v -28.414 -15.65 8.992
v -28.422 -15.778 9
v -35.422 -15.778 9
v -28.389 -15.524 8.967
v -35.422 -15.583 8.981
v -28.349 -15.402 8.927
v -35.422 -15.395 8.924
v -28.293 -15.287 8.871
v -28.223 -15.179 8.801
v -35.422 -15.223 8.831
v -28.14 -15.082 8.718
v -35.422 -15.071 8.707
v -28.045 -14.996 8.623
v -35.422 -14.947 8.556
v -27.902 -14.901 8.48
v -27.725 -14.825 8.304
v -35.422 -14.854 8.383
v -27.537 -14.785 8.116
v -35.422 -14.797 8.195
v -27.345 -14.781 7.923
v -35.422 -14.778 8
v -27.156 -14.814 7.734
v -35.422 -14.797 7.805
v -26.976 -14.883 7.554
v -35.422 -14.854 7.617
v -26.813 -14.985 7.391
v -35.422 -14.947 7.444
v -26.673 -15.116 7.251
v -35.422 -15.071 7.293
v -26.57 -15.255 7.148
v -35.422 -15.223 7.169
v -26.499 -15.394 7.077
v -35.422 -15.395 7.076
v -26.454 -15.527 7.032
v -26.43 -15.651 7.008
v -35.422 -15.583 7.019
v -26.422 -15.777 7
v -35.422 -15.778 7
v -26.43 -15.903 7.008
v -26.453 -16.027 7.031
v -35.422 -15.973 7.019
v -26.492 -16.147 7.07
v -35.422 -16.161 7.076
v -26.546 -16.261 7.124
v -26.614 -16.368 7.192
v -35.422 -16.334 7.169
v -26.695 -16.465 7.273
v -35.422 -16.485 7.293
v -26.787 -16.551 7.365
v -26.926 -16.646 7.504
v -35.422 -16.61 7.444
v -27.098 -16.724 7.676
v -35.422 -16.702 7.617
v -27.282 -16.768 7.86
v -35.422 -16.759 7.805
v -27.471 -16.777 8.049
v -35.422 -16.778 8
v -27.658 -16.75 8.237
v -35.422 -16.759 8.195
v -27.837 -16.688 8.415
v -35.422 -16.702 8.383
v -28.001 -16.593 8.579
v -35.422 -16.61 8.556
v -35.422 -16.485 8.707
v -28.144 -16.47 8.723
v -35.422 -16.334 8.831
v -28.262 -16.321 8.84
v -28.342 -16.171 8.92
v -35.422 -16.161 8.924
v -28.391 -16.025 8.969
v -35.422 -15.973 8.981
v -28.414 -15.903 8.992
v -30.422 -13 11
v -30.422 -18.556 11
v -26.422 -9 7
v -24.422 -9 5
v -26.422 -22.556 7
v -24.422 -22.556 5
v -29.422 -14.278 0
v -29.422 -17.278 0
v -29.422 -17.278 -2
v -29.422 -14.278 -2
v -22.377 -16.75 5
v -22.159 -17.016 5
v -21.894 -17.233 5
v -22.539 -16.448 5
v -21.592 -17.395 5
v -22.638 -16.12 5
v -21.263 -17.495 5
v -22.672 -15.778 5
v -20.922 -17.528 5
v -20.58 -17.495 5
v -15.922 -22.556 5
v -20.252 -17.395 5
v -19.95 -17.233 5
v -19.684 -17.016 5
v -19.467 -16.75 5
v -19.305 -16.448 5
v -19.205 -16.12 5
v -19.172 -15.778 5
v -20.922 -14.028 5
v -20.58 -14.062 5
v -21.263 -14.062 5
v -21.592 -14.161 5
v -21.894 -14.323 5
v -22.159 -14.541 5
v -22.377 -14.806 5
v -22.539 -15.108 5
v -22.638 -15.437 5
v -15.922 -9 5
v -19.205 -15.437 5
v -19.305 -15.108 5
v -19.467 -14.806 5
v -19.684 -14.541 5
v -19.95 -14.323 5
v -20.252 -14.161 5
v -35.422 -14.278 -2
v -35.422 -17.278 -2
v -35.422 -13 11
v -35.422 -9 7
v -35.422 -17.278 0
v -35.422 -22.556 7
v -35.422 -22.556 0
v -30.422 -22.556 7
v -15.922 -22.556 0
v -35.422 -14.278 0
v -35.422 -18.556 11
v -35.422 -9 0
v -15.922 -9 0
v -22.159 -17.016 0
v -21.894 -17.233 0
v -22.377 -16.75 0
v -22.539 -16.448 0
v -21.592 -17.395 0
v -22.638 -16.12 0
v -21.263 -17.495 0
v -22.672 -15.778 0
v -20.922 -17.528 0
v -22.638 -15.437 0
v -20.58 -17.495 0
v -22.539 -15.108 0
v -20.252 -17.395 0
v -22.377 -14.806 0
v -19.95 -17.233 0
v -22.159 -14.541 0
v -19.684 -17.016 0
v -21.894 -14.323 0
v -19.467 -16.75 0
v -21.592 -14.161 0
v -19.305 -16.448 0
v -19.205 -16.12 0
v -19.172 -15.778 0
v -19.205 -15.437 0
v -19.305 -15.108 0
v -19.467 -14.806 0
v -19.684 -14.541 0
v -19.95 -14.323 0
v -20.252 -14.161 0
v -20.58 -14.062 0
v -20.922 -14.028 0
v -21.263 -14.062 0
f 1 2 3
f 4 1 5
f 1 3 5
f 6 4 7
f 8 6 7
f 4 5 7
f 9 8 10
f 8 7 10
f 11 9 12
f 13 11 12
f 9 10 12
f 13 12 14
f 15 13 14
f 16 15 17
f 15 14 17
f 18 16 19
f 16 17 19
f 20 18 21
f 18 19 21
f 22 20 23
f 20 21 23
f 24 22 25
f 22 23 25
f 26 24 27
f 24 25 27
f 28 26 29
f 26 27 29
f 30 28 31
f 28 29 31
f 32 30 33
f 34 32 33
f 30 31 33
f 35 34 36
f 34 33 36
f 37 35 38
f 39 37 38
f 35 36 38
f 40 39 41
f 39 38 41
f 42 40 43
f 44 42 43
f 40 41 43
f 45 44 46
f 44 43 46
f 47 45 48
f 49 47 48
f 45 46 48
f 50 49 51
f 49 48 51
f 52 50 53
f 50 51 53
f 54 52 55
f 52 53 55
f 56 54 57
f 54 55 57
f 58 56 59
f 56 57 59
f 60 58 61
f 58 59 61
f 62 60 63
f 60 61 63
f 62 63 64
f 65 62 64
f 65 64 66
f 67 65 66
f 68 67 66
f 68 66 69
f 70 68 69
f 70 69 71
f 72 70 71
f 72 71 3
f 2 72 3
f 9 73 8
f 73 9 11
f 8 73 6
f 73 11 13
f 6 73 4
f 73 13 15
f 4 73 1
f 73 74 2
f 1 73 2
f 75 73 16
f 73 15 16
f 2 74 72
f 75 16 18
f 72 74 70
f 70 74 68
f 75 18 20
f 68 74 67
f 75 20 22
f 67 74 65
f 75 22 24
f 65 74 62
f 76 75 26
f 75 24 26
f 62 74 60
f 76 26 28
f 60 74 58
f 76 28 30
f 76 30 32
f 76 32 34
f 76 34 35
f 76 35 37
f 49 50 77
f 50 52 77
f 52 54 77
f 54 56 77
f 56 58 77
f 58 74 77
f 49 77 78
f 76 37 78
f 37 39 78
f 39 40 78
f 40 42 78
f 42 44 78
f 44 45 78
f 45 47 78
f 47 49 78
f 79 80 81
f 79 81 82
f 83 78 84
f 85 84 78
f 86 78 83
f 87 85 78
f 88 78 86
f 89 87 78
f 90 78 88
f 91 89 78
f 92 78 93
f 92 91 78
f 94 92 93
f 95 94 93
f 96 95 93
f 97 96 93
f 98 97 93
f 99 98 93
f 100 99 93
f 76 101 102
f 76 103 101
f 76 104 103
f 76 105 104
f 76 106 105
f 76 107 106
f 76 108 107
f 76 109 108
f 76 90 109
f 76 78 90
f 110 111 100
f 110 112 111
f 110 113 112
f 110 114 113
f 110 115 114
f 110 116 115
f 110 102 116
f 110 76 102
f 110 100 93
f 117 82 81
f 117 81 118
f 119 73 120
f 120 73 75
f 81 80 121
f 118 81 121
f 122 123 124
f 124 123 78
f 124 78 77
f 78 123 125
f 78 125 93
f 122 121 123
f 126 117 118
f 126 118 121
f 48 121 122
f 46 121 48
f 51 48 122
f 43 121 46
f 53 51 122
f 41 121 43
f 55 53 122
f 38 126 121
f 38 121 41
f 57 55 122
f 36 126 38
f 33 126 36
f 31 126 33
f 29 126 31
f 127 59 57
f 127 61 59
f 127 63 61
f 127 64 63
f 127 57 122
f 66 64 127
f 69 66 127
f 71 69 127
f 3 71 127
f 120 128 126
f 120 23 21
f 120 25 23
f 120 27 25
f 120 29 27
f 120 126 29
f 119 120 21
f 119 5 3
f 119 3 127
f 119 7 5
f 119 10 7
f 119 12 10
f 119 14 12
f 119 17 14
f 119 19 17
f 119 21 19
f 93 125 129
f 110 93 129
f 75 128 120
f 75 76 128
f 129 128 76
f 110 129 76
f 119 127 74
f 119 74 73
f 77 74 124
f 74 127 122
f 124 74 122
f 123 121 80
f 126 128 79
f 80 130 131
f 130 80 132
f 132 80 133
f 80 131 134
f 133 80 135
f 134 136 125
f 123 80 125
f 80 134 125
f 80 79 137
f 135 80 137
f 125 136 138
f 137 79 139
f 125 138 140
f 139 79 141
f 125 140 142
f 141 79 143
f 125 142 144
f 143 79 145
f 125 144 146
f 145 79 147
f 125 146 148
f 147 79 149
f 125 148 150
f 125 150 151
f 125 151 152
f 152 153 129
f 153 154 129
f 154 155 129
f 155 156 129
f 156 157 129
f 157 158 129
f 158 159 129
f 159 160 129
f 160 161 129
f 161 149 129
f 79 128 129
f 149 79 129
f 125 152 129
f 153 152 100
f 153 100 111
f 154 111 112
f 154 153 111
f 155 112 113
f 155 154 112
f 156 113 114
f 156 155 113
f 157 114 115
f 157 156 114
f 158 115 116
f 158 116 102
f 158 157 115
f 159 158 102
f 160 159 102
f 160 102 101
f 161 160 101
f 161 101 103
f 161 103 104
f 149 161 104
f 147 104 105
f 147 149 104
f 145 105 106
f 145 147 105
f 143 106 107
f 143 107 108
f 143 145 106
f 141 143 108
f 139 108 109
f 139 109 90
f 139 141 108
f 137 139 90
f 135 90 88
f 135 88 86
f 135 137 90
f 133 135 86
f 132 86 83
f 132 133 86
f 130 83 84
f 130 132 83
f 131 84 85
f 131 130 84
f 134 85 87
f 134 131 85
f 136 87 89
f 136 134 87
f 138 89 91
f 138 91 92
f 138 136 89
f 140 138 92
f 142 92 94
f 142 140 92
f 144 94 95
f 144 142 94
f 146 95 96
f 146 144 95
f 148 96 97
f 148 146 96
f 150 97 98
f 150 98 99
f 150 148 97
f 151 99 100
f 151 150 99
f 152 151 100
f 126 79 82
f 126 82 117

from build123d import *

# Parameters (mm, degrees)
SKETCH1_W           = 19.5
SKETCH1_H           = 13.556349186
SKETCH1_R           = 1.75
BOSS_EXTRUDE1_DEPTH = 5
SKETCH2_W           = 6
SKETCH2_H           = 3
BOSS_EXTRUDE2_DEPTH = 2
SKETCH3_W           = 6
SKETCH3_H           = 13.556349186
SKETCH3_R           = 1
BOSS_EXTRUDE3_DEPTH = 5
CHAMFER1_SIZE       = 4
CHAMFER2_SIZE       = 6


with BuildPart() as part:
    # Sketch1 → Boss-Extrude1 (new body)
    with BuildSketch(Plane.XY):
        with Locations((-25.671858451, -15.778174593)):
            Rectangle(SKETCH1_W, SKETCH1_H)
        with Locations((-20.921858451, -15.778174593)):
            Circle(SKETCH1_R, mode=Mode.SUBTRACT)
    extrude(amount=BOSS_EXTRUDE1_DEPTH)

    # Sketch2 → Boss-Extrude2 (add)
    with BuildSketch(Plane(origin=(0, 0, 0), x_dir=(-1, 0, 0), z_dir=(0, 0, -1))):
        with Locations((32.421858451, -15.778174593)):
            Rectangle(SKETCH2_W, SKETCH2_H)
    extrude(amount=BOSS_EXTRUDE2_DEPTH)

    # Sketch3 → Boss-Extrude3 (add)
    with BuildSketch(Plane.ZY.offset(35.421858451)):
        with Locations((8, -15.778174593)):
            Rectangle(SKETCH3_W, SKETCH3_H)
        with Locations((8, -15.778174593)):
            Circle(SKETCH3_R, mode=Mode.SUBTRACT)
    extrude(amount=-BOSS_EXTRUDE3_DEPTH)

    # Chamfer1
    chamfer1_edges = [part.edges().sort_by_distance(p)[0] for p in [
        (-32.921858451, -9, 11),
        (-32.921858451, -22.556349186, 11),
    ]]
    chamfer(chamfer1_edges, length=CHAMFER1_SIZE)

    # Chamfer2
    # the kernel refuses this chamfer: 6 mm, written as the material it adds along each edge
    with BuildSketch(Plane(origin=(-30.421858451, -22.556349186, 5), x_dir=(-0.0274958766105862, 0, 0.9996219169112968), z_dir=(0, 1, 0))) as chamfer2_piece_1_section:
        Polygon((CHAMFER2_SIZE * 0.999621916911, CHAMFER2_SIZE * 0.0274958766106), (-CHAMFER2_SIZE * 0.0274958766106, CHAMFER2_SIZE * 0.999621916911), (0, 0), align=None)
    chamfer2_piece_1 = extrude(amount=13.556349186, mode=Mode.PRIVATE)
    chamfer2_piece_1 = split(chamfer2_piece_1, bisect_by=Plane(origin=(-28.301106776, -12.243149914, 10.243149914), z_dir=(0, -0.7071067811865477, -0.7071067811865474)), keep=Keep.TOP, mode=Mode.PRIVATE)
    chamfer2_piece_1 = split(chamfer2_piece_1, bisect_by=Plane(origin=(-28.301106776, -15.778174309, 11), z_dir=(0, 0, -1)), keep=Keep.TOP, mode=Mode.PRIVATE)
    chamfer2_piece_1 = split(chamfer2_piece_1, bisect_by=Plane(origin=(-28.301106776, -19.313198988, 10.243150199), z_dir=(0, 0.7071067811865474, -0.7071067811865477)), keep=Keep.TOP, mode=Mode.PRIVATE)
    chamfer2_piece_1 = chamfer2_piece_1 - Plane(origin=(-28.301106776, -15.778174593, 8), x_dir=(0, 0, 1), z_dir=(-1, 0, 0)) * Cylinder(1, 52, mode=Mode.PRIVATE)
    add(chamfer2_piece_1)


solid = part.part
